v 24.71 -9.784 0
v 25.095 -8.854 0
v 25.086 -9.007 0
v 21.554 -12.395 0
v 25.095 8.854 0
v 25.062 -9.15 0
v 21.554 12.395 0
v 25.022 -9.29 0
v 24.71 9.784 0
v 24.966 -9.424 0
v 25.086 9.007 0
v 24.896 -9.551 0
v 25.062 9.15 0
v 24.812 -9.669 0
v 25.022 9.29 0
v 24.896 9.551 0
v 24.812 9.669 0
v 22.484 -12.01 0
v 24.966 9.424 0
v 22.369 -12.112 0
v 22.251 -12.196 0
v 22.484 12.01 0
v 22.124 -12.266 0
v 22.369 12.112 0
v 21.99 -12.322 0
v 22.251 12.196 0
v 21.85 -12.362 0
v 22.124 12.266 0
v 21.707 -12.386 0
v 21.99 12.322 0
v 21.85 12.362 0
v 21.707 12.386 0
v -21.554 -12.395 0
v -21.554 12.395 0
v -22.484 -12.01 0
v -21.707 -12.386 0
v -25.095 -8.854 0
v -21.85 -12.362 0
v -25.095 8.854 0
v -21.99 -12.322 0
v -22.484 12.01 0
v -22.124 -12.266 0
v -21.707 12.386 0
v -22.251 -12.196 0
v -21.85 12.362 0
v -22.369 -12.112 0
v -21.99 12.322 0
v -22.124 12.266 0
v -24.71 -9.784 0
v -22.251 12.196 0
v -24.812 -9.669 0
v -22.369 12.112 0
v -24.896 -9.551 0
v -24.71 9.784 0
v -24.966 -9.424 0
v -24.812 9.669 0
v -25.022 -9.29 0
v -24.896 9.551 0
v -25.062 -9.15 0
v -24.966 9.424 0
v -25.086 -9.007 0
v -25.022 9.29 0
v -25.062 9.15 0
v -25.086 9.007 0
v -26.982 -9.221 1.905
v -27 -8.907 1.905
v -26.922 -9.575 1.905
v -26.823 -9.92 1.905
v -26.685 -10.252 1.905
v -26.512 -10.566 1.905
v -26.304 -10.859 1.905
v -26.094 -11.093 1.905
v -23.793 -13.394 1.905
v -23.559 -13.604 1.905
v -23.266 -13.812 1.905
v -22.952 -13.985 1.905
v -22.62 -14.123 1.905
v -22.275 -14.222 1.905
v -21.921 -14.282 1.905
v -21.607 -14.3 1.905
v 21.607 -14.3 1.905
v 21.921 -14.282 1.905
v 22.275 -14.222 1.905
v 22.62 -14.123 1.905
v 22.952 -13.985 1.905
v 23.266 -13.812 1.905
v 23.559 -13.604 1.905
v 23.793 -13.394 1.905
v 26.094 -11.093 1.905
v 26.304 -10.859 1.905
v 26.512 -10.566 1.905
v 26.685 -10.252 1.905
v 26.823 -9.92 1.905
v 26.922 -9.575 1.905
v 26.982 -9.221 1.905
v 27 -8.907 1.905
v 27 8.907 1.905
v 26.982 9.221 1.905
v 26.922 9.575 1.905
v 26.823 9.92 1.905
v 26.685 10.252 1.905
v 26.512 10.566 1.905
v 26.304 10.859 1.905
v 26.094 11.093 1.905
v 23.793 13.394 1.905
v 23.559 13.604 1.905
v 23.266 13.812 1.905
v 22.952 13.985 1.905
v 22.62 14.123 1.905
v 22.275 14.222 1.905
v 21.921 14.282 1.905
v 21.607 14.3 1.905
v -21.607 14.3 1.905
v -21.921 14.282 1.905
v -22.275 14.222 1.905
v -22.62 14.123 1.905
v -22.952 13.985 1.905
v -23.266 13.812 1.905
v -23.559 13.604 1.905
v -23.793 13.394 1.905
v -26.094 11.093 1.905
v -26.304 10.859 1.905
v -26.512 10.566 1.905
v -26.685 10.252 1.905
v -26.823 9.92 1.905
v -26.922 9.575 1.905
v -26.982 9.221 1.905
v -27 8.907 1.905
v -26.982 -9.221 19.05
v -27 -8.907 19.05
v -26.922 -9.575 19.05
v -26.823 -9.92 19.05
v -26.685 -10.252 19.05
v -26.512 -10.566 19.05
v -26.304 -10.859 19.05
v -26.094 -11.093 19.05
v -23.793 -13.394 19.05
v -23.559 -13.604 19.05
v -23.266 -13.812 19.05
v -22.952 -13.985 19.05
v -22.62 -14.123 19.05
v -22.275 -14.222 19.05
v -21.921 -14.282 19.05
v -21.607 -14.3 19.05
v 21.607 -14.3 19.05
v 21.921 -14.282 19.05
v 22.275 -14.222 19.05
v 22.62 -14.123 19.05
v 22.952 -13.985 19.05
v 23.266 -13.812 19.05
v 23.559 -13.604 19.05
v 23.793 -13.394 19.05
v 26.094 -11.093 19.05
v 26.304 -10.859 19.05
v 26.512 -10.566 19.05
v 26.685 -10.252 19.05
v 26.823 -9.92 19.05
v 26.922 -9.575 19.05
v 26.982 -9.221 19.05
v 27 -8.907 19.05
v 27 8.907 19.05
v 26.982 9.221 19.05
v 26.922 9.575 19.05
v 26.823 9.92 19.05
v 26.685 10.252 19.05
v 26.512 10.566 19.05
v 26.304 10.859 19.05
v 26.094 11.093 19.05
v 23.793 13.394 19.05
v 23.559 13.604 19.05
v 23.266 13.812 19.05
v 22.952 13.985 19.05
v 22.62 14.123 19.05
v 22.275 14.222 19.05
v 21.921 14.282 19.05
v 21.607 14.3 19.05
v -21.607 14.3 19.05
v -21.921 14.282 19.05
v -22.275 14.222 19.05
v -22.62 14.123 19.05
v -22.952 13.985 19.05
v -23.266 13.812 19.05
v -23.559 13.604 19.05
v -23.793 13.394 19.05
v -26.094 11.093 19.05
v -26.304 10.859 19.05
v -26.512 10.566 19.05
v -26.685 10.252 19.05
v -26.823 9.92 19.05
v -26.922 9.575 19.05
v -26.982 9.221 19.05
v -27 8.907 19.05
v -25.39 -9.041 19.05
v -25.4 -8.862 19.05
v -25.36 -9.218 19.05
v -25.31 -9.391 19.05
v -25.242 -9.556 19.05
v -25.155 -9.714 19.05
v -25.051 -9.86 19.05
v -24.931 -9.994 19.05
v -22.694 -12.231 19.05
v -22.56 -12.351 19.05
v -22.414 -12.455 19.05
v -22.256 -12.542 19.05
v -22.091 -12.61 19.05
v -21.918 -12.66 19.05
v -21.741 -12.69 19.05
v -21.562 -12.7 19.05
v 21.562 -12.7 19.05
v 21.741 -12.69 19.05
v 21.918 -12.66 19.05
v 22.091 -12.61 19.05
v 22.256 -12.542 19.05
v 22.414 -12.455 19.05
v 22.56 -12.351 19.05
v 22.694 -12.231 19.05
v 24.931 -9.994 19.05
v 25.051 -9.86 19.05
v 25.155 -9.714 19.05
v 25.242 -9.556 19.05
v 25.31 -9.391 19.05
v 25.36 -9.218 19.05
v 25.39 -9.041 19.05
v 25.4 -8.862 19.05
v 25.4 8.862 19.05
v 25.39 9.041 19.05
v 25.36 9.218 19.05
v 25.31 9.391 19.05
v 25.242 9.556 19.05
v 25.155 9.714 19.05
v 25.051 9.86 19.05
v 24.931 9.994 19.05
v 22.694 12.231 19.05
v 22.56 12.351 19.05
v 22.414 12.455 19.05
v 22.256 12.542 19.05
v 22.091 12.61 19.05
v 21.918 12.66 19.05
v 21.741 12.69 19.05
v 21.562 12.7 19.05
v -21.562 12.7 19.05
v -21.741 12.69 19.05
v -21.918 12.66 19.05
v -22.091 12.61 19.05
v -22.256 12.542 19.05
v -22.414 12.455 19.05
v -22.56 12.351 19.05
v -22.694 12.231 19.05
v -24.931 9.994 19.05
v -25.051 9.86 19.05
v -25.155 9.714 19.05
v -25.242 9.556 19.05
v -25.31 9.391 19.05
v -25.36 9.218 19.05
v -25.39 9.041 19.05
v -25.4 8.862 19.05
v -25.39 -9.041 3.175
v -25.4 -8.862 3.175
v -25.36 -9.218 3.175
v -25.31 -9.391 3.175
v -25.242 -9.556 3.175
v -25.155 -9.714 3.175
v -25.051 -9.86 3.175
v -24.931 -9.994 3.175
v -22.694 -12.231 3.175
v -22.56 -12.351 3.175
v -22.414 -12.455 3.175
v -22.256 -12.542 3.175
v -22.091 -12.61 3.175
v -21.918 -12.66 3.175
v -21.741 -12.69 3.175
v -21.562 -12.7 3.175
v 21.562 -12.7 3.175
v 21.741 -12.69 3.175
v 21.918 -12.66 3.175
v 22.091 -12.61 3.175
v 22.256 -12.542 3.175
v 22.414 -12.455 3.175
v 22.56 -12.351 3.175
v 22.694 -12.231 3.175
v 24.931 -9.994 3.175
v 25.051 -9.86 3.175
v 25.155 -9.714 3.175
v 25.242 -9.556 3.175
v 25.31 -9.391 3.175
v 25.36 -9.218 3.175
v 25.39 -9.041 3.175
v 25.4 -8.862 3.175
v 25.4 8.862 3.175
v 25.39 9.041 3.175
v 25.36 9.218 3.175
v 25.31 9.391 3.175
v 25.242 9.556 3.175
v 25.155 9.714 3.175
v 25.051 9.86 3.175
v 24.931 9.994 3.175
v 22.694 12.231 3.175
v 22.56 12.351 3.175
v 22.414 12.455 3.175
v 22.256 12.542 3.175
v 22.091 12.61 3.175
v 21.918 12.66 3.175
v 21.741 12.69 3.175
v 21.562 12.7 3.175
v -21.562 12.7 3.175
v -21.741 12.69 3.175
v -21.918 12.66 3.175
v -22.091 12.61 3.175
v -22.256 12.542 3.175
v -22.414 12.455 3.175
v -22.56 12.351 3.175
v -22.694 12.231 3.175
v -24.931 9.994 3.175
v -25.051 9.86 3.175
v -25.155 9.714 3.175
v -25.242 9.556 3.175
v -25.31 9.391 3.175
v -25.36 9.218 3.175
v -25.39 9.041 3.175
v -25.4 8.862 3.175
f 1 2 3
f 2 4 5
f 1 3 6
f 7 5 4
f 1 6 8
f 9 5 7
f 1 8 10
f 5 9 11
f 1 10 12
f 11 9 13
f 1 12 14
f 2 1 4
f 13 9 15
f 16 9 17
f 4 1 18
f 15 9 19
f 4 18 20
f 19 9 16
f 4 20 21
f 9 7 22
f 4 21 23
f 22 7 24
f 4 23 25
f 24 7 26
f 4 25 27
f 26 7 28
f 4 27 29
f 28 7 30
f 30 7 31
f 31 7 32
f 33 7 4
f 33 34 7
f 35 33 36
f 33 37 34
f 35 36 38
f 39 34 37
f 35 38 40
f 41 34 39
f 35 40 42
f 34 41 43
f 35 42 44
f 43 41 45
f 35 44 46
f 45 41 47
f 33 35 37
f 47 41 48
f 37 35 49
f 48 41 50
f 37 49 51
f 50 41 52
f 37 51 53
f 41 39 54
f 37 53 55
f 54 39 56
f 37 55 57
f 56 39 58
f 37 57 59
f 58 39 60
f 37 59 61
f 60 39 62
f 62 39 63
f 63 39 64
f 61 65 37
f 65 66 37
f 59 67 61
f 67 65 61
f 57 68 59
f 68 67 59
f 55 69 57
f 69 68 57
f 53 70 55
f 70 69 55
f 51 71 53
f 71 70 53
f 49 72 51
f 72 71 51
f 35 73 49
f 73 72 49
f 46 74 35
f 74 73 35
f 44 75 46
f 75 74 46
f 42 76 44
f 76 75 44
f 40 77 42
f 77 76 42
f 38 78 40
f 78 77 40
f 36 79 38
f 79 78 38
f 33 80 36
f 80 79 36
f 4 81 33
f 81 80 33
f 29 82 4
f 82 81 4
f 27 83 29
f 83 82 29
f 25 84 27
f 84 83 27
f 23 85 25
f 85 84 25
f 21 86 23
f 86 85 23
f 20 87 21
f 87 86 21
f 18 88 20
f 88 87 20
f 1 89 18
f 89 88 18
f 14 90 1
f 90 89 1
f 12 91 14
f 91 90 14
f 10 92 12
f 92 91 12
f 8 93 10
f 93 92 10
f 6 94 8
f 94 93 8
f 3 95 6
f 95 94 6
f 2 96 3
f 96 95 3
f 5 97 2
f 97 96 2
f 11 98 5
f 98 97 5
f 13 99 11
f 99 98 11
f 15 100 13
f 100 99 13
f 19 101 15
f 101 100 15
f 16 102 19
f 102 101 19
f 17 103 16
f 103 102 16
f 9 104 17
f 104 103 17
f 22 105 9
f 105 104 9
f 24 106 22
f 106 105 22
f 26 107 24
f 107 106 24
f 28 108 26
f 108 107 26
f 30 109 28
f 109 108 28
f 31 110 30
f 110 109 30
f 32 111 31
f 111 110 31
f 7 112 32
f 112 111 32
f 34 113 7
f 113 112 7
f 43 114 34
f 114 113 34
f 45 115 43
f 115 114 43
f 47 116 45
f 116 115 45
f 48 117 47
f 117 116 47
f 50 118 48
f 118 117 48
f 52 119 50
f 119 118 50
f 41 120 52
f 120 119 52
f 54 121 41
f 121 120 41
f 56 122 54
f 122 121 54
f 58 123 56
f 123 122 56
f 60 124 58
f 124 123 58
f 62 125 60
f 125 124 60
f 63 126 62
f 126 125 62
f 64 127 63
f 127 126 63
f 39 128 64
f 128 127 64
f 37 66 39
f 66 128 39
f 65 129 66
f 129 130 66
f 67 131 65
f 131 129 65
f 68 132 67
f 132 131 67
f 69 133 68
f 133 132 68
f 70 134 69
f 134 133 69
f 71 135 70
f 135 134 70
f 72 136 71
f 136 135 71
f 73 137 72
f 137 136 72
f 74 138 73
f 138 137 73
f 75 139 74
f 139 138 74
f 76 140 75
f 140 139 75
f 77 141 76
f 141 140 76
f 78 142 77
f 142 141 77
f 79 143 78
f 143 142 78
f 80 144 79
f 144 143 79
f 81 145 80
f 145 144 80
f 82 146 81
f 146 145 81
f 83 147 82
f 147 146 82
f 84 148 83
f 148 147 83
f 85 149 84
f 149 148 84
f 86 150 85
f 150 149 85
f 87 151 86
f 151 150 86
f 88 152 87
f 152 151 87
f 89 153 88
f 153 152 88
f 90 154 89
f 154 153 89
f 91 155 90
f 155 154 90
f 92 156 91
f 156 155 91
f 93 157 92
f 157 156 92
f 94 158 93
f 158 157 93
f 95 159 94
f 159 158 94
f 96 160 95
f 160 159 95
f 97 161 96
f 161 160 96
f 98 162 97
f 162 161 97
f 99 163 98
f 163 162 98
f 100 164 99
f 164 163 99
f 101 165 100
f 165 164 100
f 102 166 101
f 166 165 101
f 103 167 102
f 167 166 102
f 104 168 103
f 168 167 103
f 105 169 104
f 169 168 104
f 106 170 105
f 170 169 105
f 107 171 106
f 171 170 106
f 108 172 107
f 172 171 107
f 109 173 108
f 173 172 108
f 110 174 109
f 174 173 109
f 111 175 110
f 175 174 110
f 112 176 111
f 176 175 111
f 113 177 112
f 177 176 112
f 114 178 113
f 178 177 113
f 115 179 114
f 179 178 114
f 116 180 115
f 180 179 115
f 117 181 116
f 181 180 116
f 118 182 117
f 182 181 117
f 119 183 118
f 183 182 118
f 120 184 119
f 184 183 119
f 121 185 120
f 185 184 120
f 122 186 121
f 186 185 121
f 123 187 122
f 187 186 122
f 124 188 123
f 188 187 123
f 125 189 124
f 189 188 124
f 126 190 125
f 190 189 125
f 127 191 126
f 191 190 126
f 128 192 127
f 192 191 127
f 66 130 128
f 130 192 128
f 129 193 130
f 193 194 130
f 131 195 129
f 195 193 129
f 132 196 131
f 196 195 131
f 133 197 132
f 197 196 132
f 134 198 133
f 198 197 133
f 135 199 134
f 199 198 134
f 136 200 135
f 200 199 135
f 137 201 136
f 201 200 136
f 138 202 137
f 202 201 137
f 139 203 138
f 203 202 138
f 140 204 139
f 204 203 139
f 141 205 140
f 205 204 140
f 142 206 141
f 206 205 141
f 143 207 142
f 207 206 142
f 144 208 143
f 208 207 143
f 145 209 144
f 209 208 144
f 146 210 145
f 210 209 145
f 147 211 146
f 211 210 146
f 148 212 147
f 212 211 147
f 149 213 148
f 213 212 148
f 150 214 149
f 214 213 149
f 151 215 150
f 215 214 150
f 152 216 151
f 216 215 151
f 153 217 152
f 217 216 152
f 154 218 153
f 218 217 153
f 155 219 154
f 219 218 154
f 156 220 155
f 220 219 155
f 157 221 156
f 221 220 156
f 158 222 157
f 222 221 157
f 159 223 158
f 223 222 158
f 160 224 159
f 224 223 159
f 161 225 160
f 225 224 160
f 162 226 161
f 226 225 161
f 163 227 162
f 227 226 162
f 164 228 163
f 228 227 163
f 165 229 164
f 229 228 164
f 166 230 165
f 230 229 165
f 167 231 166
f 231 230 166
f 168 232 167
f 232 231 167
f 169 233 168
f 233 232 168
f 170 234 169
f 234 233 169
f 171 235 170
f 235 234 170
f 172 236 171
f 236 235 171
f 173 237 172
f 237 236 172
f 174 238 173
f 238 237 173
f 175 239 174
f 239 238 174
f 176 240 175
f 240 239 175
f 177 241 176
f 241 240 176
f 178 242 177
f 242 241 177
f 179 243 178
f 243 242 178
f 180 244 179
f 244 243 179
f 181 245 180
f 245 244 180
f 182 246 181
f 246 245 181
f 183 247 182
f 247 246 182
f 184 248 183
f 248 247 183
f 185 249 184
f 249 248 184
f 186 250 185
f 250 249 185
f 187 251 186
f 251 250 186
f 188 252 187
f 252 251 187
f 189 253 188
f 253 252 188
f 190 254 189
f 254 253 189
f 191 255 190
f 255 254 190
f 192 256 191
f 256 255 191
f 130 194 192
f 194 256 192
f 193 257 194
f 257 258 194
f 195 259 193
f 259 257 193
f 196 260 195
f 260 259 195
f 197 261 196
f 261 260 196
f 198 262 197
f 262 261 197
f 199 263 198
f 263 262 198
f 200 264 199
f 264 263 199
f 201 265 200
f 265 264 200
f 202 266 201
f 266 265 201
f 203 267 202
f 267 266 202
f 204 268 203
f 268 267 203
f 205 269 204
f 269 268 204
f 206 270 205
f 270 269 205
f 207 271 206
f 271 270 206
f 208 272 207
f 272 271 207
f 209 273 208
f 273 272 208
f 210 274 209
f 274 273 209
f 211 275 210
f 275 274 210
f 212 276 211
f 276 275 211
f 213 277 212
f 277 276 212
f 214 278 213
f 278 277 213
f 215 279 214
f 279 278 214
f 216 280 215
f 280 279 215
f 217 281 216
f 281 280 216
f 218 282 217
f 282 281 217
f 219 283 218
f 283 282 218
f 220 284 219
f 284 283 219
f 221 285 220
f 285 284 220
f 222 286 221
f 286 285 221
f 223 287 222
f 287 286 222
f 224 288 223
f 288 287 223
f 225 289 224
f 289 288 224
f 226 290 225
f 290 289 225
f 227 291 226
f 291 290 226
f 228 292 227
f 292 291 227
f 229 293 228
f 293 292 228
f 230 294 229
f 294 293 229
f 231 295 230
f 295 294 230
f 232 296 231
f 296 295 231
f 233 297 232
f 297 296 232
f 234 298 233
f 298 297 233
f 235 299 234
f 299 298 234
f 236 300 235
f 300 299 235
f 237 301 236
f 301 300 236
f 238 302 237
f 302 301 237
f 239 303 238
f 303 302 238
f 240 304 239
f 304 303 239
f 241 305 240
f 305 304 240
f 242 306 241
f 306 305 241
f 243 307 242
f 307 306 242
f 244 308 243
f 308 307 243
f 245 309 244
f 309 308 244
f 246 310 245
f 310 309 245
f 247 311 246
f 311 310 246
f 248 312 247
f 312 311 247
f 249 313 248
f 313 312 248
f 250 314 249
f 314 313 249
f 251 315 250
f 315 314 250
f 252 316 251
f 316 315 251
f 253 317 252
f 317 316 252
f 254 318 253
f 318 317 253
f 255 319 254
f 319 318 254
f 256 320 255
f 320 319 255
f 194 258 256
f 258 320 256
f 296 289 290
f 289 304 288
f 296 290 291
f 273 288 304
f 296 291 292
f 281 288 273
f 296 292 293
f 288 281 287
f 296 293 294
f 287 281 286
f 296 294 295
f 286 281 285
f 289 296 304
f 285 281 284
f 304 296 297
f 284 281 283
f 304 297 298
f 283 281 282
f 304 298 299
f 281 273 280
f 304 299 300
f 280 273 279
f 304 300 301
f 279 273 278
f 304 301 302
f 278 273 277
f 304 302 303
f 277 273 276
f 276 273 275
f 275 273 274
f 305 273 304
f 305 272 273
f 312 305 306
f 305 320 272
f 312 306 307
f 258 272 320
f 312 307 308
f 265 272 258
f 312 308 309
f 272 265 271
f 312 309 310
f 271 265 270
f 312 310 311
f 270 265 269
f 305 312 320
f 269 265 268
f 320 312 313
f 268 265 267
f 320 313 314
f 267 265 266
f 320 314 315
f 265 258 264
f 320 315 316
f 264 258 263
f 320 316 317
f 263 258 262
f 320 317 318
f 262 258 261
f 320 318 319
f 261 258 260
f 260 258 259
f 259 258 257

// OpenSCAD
// file: ../lib/TOGMod1Constructors.scad
// TOGMod1Constructors-v1.11
// 
// Functions to construct objects understood by TOGMod1
// 
// v1.1:
// - Add togmod1_make_rounded_rect
// v1.2:
// - togmod1_make_rounded_rect can make ovals
// v1.3:
// - togmod1_circle_points, to just get the points of a circle
// - if pos parameter to circle function has a third element,
//   returned vertexes will include it as the z component;
// v1.3.1
// - Some assertions
// v1.4:
// - Refactor togmod1_rounded_rect_points and togmod1_circle_points
//   to use togmod1__make_nd_vector_adder for adapting to whatever
//   `pos` parameter is.
// v1.5:
// - togmod_rounded_rect_points will not simplify completely rounded sides
//   (where length of side is exactly twice the rounding radius)
//   unless simplify_rounded_sides=true
//   - This makes it more useful for polyhedron generation,
//     where radius varies, but number of points must remain constant.
// v1.6:
// - togmod1_make_rect makes a simple rectangle
// - togmod1_make_rounded_rect will defer to togmod1_make_rect when r=0
// v1.7:
// - togmod1_make_circle will return empty shape (["union"]) when d=0
// v1.8:
// - Add togmod1_text
// v1.9:
// - togmod1_circle_points uses 3 as minimum circle point count instead of 6
// v1.10:
// - Fix togmod1_linear_extrude_y so that range corresponds to Y start/end and
//   polygon X,Y correspond to X,Z.  Previously it was rotated wrongly,
//   which would have gone unnoticed for symmetrical shapes centered at 0,0.
// v1.11:
// - Remove an 'echo'

use <./TOGArrayLib1.scad>

function togmod1__make_nd_vector_adder(origin=[0,0]) =
	let(origin_is_zero = tal1_reduce(true, origin, function(prev,item) prev && item == 0))
	origin_is_zero ? (function(vec) len(vec) >= len(origin) ? vec : tal1_replace_at(origin, 0, vec)) :
	function(vec) [
		for(i=[0:1:max(len(origin),len(vec))-1]) (len(vec) > i ? vec[i] : 0) + (len(origin) > i ? origin[i] : 0),
	];

assert([1,2,3] == togmod1__make_nd_vector_adder()([1,2,3]));
assert([1,2,3] == togmod1__make_nd_vector_adder([0,0,3])([1,2]));


function togmod1_make_cuboid(size) =
	assert(is_list(size))
	assert(len(size) >= 3)
	assert(is_num(size[0]))
	assert(is_num(size[1]))
	assert(is_num(size[2]))
	["polyhedron-vf", [
		[-size[0]/2, -size[1]/2, -size[2]/2],
		[+size[0]/2, -size[1]/2, -size[2]/2],
		[-size[0]/2, +size[1]/2, -size[2]/2],
		[+size[0]/2, +size[1]/2, -size[2]/2],
		[-size[0]/2, -size[1]/2, +size[2]/2],
		[+size[0]/2, -size[1]/2, +size[2]/2],
		[-size[0]/2, +size[1]/2, +size[2]/2],
		[+size[0]/2, +size[1]/2, +size[2]/2]
	], [
		[0,1,3,2],[0,4,5,1],[4,6,7,5],[3,7,6,2],[1,5,7,3],[6,4,0,2]
	]];

function togmod1_make_polygon(verts) =
	["polygon-vp", verts, [[for( i=[0:1:len(verts)-1] ) i%len(verts)]]];

function togmod1_rounded_rect_points(size, r, pos=[0,0], simplify_rounded_sides=false) =
	assert(is_list(size))
	assert(len(size) >= 2)
	let(radii = is_list(r) ? r : is_num(r) ? [r,r] : assert(false, "rounded_rect r(adius) should be list<num> or num"))
	let(rx = radii[0])
	let(ry = radii[1])
	assert(is_num(rx))
	assert(is_num(ry))
	assert(size[0] >= 2*rx, str("size[0] must be >= 2*r[0]; size[0] = ",size[0],", 2*r[0] = ",2*rx))
	assert(size[1] >= 2*ry, str("size[1] must be >= 2*r[1]; size[1] = ",size[1],", 2*r[1] = ",2*ry))
	let(quarterfn=max($fn/4, 1))
	let(qfnx = simplify_rounded_sides && size[0] == 2*rx ? quarterfn-1 : quarterfn)
	let(qfny = simplify_rounded_sides && size[1] == 2*ry ? quarterfn-1 : quarterfn)
	let(finalizepos = togmod1__make_nd_vector_adder(pos))
[
	for(a=[0 : 1 : qfnx]) let(ang=      a*90/quarterfn) finalizepos([ size[0]/2-rx + rx*cos(ang),  size[1]/2-ry + ry*sin(ang)]),
	for(a=[0 : 1 : qfny]) let(ang= 90 + a*90/quarterfn) finalizepos([-size[0]/2+rx + rx*cos(ang),  size[1]/2-ry + ry*sin(ang)]),
	for(a=[0 : 1 : qfnx]) let(ang=180 + a*90/quarterfn) finalizepos([-size[0]/2+rx + rx*cos(ang), -size[1]/2+ry + ry*sin(ang)]),
	for(a=[0 : 1 : qfny]) let(ang=270 + a*90/quarterfn) finalizepos([ size[0]/2-rx + rx*cos(ang), -size[1]/2+ry + ry*sin(ang)]),
];

function togmod1_make_rect(size) =
	togmod1_make_polygon([
		[-size[0]/2, -size[1]/2],
		[+size[0]/2, -size[1]/2],
		[+size[0]/2, +size[1]/2],
		[-size[0]/2, +size[1]/2],
	]);

function togmod1_make_rounded_rect(size, r) =
	r == 0 ? togmod1_make_rect(size) :
	togmod1_make_polygon(togmod1_rounded_rect_points(size,r,simplify_rounded_sides=true));

/**
 * Returns points for an approximation of a circle where points are at distance r from pos.
 * Can be used to make other regular polygons, but the faces will be less than that
 * distance from pos (do some trig if you want face distance, e.g. for a hex nut).
 */
function togmod1_circle_points(r, pos=[0,0], d=undef) =
	assert( !is_undef(r) || !is_undef(d) )
	assert(!is_undef(pos[0]))
	assert(!is_undef(pos[1]))
	let(finalizepos = togmod1__make_nd_vector_adder(pos))
	let(r_ = !is_undef(r) ? r : d/2)
	let(fn = max($fn, 3))
	[for(i=[0 : 1 : fn-1]) finalizepos([r_*cos(i*360/fn), r_*sin(i*360/fn)])];

function togmod1_make_circle(r, pos=[0,0], d=undef) =
	r == 0 || d == 0 ? ["union"] :
	togmod1_make_polygon(togmod1_circle_points(r=r, pos=pos, d=d));

function togmod1_make_cylinder(d, zrange=[0,1], r=undef, pos=[0,0]) =
	assert( !is_undef(r) || !is_undef(d) )
	let( r_ = !is_undef(r) ? r : d/2 )
	// TODO: Make polyhedron directly
	["linear-extrude-zs", zrange, togmod1_make_circle(r=r_, pos=pos)];

function togmod1__is_range1d(range) = is_list(range) && len(range) == 2 && is_num(range[0]) && is_num(range[1]);

function togmod1_linear_extrude_z(range, shape) =
	assert(togmod1__is_range1d(range))
	["linear-extrude-zs", range, shape];
function togmod1_linear_extrude_x(range, shape) =
	assert(togmod1__is_range1d(range))
	["rotate", [90, 0, 90], togmod1_linear_extrude_z(range, shape)];
function togmod1_linear_extrude_y(range, shape) =
	assert(togmod1__is_range1d(range))
	["rotate", [90, 0,  0], togmod1_linear_extrude_z([-range[1], -range[0]], shape)];

function togmod1_text(text, size, font, halign, valign, spacing, direction, language, script) =
	["text-tsfhvsdls", text, size, font, halign, valign, spacing, direction, language, script];
// file: ../lib/TOGArrayLib1.scad
// TOGArrayLib1.5
// 
// Functions for working with arrays.
// 
// v1.1:
// - tal1_reduce assert(is_list(items)) to prevent infinite recursion
//   when given undefined or other non-list values
// v1.1.1:
// - Fix tal1_uniq_remap_v2 to return "list-remap-result" as the
//   first element of the returned list
// v1.2:
// - Add tal1_replace_at function
// v1.3:
// - tal1_is_vec_of, tal1_is_vec_of_num
// v1.4:
// - tal1_assert_for_each, for when you want to assert something
//   about each of a list of items and get nice failure messages
// v1.5:
// - Add tal1_duplicate_reversed function, which may be
//   handy when generating symmetrical polygons and stuff.

/**
 * Make a list with the contents of list `a`,
 * but starting at offset `off`, replaced by the contents of list `b`.
 * len(result) = max(len(a), off+len(b))
 */
function tal1_replace_at(a, off, b, default_value=undef, default_value_function=undef) =
	assert(is_list(a))
	assert(is_list(b))
	let( _dvf = !is_undef(default_value_function) ? default_value_function : function(i) default_value )
[
	for( i=[0:1:min(off,len(a))-1] ) a[i],
	for( i=[len(a):1:off-1] ) _dvf(i),
	for( i=[off:1:off+len(b)-1] ) b[i-off],
	for( i=[off+len(b):1:len(a)-1] ) a[i],
];

// Simplest case
assert([] == tal1_replace_at([], 0, []));
// Second simplest cases
assert(["foo"] == tal1_replace_at(["foo"], 0, []));
assert(["foo"] == tal1_replace_at([], 0, ["foo"]));
// Replace one item
assert(["foo","quux","baz"] == tal1_replace_at(["foo","bar","baz"], 1, ["quux"]));
// Replace and extend
assert(["foo","quux","tuna","tina"] == tal1_replace_at(["foo","bar","baz"], 1, ["quux", "tuna", "tina"]));
// Add beyond end of `a`
assert(["foo","zzz","quux"] == tal1_replace_at(["foo"], 2, ["quux"], default_value="zzz"));
// Adding 'nothing' should still fill to that point with defaults
assert(["foo","zzz","zzz"] == tal1_replace_at(["foo"], 3, [], default_value="zzz"));


function tal1_reduce(start, items, func, offset=0) =
	assert(is_list(items))
	len(items) == offset ? start :
	tal1_reduce(func(start, items[offset]), items, func, offset+1);

function tal1_consecutive_duplicate_count(items) = tal1_reduce(
	[0, undef],
	items,
	function(z,item) [z[0] + (item == z[1] ? 1 : 0), item]
)[0];

assert(0 == tal1_consecutive_duplicate_count([]));
assert(0 == tal1_consecutive_duplicate_count([50]));
assert(1 == tal1_consecutive_duplicate_count([50,50]));
assert(0 == tal1_consecutive_duplicate_count([50,51,52,53]));
assert(1 == tal1_consecutive_duplicate_count([50,51,52,52]));
assert(3 == tal1_consecutive_duplicate_count([50,50,50,50]));

// Set test_size to arbirarily large values
// to ensure that OpenSCAD can handle heavy recursion
let(test_size=1000) assert(test_size/2 == tal1_consecutive_duplicate_count([for(i=[0:1:test_size-1]) floor(i/2)]));



function tal1_uniq_(items, off0, off1) =
	let(chunklen = off1-off0)
	chunklen == 0 ? [] :
	chunklen == 1 ? [items[off0]] :
	let(half=floor(chunklen/2))
	let(left  = tal1_uniq_(items, off0     , off0+half))
	let(right = tal1_uniq_(items, off0+half, off1     ))
	assert(len(left) > 0)
	assert(len(right) > 0)
	left[len(left)-1] == right[0] ? [each left, for(i=[1:1:len(right)-1]) right[i]] :
	[each left, each right];

/** Given a list of items, returns a new list with identical consecutive items merged */
function tal1_uniq(items) = tal1_uniq_(items, 0, len(items));

assert([] == tal1_uniq([]));
assert([123] == tal1_uniq([123]));
assert([55,0,1,2,3] == tal1_uniq([55,0,1,2,3]));
assert([55,0,1,2] == tal1_uniq([55,0,1,1,2]));
assert([55,0,1] == tal1_uniq([55,55,0,0,0,0,0,0,1,1,1,1]));
assert([55,0] == tal1_uniq([55,0,0,0,0,0,0,0]));



/**
 * Returns [new items, old index -> new index mapping].
 * No-op version.
 */
function tal1_uniq_remap_v1(items) =
	["list-remap-result", items, [for (vi=[0:1:len(items)-1]) vi]];

// [a, a, b, b, c, c]
//
// [a,    ...], []  -> [a],[0]
// [a, a, ...], [0] -> [a],[0,0]

assert([1,2,3] == [1,2,3]);

/**
 * Recursive version that will combine adjacent identical vertexes,
 * but will use the original items.
 */
function tal1_uniq_remap_v2(items, map=[]) =
	let(index = len(map))
	len(items) == index ? ["list-remap-result", items, map] :
	index == 0 ? tal1_uniq_remap_v2(items, [0]) :
	items[index] == items[map[index-1]] ? tal1_uniq_remap_v2(items, [for(vi=map) vi, map[index-1]]) :
	tal1_uniq_remap_v2(items, [for(vi=map) vi, index]);

assert(tal1_uniq_remap_v2([1,1,2,2,3,4]) == ["list-remap-result", [1,1,2,2,3,4], [0,0,2,2,4,5]]);


/**
 * Returns true if `vec` is a list of at least min_len items
 * and component_check(each item, even those beyond min_len) is true.
 */
function tal1_is_vec_of(vec, min_len=0, component_check=function(x) true) =
	assert(is_num(min_len) && min_len >= 0)
	assert(is_function(component_check))
	is_list(vec) && len(vec) >= min_len &&
	tal1_reduce(true, vec, function(prev,item) prev && component_check(item));

function tal1_is_vec_of_num(vec, min_len=0) = tal1_is_vec_of(vec, min_len, function(i) is_num(i));

assert( true == tal1_is_vec_of_num([1,2,3]));
assert( true == tal1_is_vec_of_num([]));
assert( true == tal1_is_vec_of_num([1,2,3], 3));
assert(false == tal1_is_vec_of_num([1,2], 3));
assert(false == tal1_is_vec_of_num([1,2,"spoon"], 3));
// Requirements are ambiguous when
// first min_len items are numbers, but there are non-numeric items afterwards,
// so let's error on the side of saying 'no, it's not a list of numbers';
// i.e. the item check and the min_len are independent.
assert(false == tal1_is_vec_of_num([1,2,3,"artichoke"], 3));


/**
 * Asserts that item_checker(each item in list, index of item)[0] is true.
 * Second element of item_checker return value is assertion message.
 * Returns the original list, in case that's useful to you.
 */
function tal1_assert_for_each(list, item_checker) =
	let( _ignored = [ for(i=[0:1:len(list)-1])
		let(q=item_checker(list[i],i))
		let(passed=is_bool(q) ? q : is_list(q) ? q[0] : assert(false, str(
			"tal1_assert_for_each: item_checker should return Bool|[Bool,String], but returned ",
			q, " for item at index ", i)))
		let(message=is_list(q) ? q[1] : undef)
		assert(passed, message)
		q
	])
	list;

// Callback can return a boolean...
assert([1,2,3] == tal1_assert_for_each([1,2,3], function(v,i) is_num(v)));
// ...or a [boolean, string]
assert([1,2,3] == tal1_assert_for_each([1,2,3], function(v,i) [is_num(v), "element be a num"]));

// [a, b, c] -> [a, b, c, rxf(c), rxf(b), rxf(a)]
function tal1_duplicate_reversed(list, rxf=function(item) item) =
	[
		each list,
		for( i=[len(list)-1 : -1 : 0] ) rxf(list[i]),
	];
// file: ../lib/TOGVecLib0.scad
// Note: TOGMod1Constructors's togmod1__make_nd_vector_adder is used for similar purpose.

function togvec0_extend(vec, length, filler=0) = [
	for( i=[0 : 1 : length-1] ) len(vec) <= i ? filler : vec[i]
];

function togvec0_add_vec(a, b) =
	let( newlen = max(len(a), len(b)) )
	togvec0_extend(a, newlen) + togvec0_extend(b, newlen);

function togvec0_offset_points(points, offset, numtovec=function(n) [0,0,n] ) =
	let( offset_vec =
		is_list(offset) ? offset :
		is_num(offset) ? numtovec(offset) :
		assert(false, str("togvec0_offset_points: `offset` must be a List<Number> or Number; got: ", offset)) )
	[for(p=points) togvec0_add_vec(p, offset_vec)];
// file: ../lib/TOGComplexLib1.scad
function tcplx1_multiply(a, b) =
	[a[0]*b[0] - a[1]*b[1], a[0]*b[1] + a[1]*b[0]];
function tcplx1_divide(a, b) =
	let(bot = (b[0]*b[0] + b[1]*b[1]))
	[
		(a[0]*b[0] + a[1]*b[1])/bot,
		(a[1]*b[0] - a[0]*b[1])/bot
	];

assert([-11,23] == tcplx1_multiply([3,2], [1,7]));

assert([-1,3] == tcplx1_multiply([3,1], [0,1]));
assert([-1,3] == tcplx1_multiply([0,1], [3,1]));

echo(tcplx1_divide([-1,3], [3,1]));
assert([0,1] == tcplx1_divide([-1,3], [3,1]));

function tcplx1_normalize(vec) =
	let(veclen = sqrt(vec[0]*vec[0]+vec[1]*vec[1]))
	[vec[0] / veclen, vec[1] / veclen];

function tcplx1_relative_turnvec_vv(v0, v1) =
	tcplx1_divide(tcplx1_normalize(v1), tcplx1_normalize(v0));

function tcplx1_relative_turnvec_abc(p0, p1, p2) = tcplx1_relative_turnvec_vv(p1-p0, p2-p1);

// A 90-degree turn
assert([0,1] == tcplx1_relative_turnvec_abc([0,0], [1,0], [1,1]));
assert([0,1] == tcplx1_relative_turnvec_abc([0,0], [0,1], [-1,1]));

// A 45-degree turn
assert(tcplx1_normalize([1,1]) == tcplx1_relative_turnvec_abc([0,0], [1,0], [ 2,1]));
assert(tcplx1_normalize([1,1]) == tcplx1_relative_turnvec_abc([0,0], [0,1], [-1,2]));


function tcplx1_relative_angle_abc(p0, p1, p2) =
	let(turnvec = tcplx1_relative_turnvec_abc(p0, p1, p2))
	atan2(turnvec[1], turnvec[0]);

assert(-135 == tcplx1_relative_angle_abc([0,0], [1,0], [0,-1]));
assert( -90 == tcplx1_relative_angle_abc([0,0], [1,0], [1,-1]));
assert(   0 == tcplx1_relative_angle_abc([0,0], [1,0], [2, 0]));
assert(  90 == tcplx1_relative_angle_abc([0,0], [1,0], [1, 1]));
assert( 135 == tcplx1_relative_angle_abc([0,0], [1,0], [0, 1]));

assert(  90 == tcplx1_relative_angle_abc([1,1], [3,3], [1, 5]));
// file: ../lib/SimpleCap0.scad
// SimpleCap0.4
// 
// Library for making very simple caps for things
// whose outline can be described by a rath.
// 
// Versions:
// v0.2:
// - Bevel the bottom somewhat
// v0.3:
// - Allow bevel_size to be overridden.
//   Useful in cases where the default makes an invalid shape.
// v0.4
// - Support floor_thickness=0 meaning 'hollow tube'

use <../lib/TOGPath1.scad>
use <../lib/TOGPolyhedronLib1.scad>
use <../lib/TOGVecLib0.scad>

function simplecap0_decode_rath(shape) =
	assert(is_list(shape) && len(shape) >= 1, str("Shape must be a list of length at least 1, got: ", shape))
	shape[0] == "togpath1-rath" ? shape :
	shape[0] == "circle-d" ? togpath1_make_circle_rath(r=shape[1]/2) :
	shape[0] == "circle-r" ? togpath1_make_circle_rath(r=shape[1]) :
	shape[0] == "oval-wh" ? let(size=shape[1]) togpath1_make_rectangle_rath([size[0],size[1]], [["round", min(size[0],size[1])/2]]) :
	assert(false, str("Unrecognized shape description: ", shape));

function simplecap0_make_cap(inner_shape, total_height=19.05, floor_thickness=3.175, wall_thickness=1.6, bevel_size=undef) =
	let( rath = simplecap0_decode_rath(inner_shape) )
	let( eff_bevel_size = !is_undef(bevel_size) ? bevel_size :
		// Could be clever here based on wall_thickness and the rath.
		// For now, default to effectively floor_thicknesS*0.6, since that matches existing behavior.
		max(0.1, floor_thickness*0.6)
	)
	let( t0 = 0, t1 = wall_thickness )
	let( y0 = 0, yt = total_height, yf = floor_thickness )
	let( bb = eff_bevel_size )
	let( closed = yf > 0 )
	tphl1_make_polyhedron_from_layer_function([
		[y0   , t1-bb],
		[y0+abs(bb), t1   ],
		[yt   , t1   ],
		[yt   , t0   ],
		[yf   , t0   ],
		if( !closed ) [yf, t1-bb],
	], function(zo) let(z = zo[0], wall_offset=zo[1])
	   togpath1_rath_to_polypoints(togpath1_offset_rath(rath, wall_offset)),
		layer_points_transform = "key0-to-z",
		cap_top    = closed,
		cap_bottom = closed
	);
// file: ../lib/TOGMod1.scad
// TOGMod1.9
// OpenSCAD library for representing shapes
// 
// See also: Functional OpenSCAD (https://github.com/thehans/FunctionalOpenSCAD)
// 
// v1.8:
// - Add `text-tsfhvsdls`
// v1.9
// - Add `offset-ds` (offset with _d_elta a _s_hape)

module togmod1_domodule(mod) {
	assert(is_list(mod));
	assert(len(mod) > 0);
	if( mod[0] == "polygon-vp" ) {
		// ["polygon-vp", vertexes, paths]
		polygon(points=mod[1], paths=mod[2]);
	} else if( mod[0] == "polyhedron-vf" ) {
		polyhedron(mod[1], faces=mod[2]);
	} else if( mod[0] == "scale" ) {
		assert(len(mod) == 3);
		scale(mod[1]) togmod1_domodule(mod[2]);
	} else if( mod[0] == "translate" ) {
		assert(len(mod) == 3);
		assert(is_list(mod[1]));
		for(c=mod[1]) assert(is_num(c), "translate component should be numeric");
		translate(mod[1]) togmod1_domodule(mod[2]);
	} else if( mod[0] == "rotate" ) {
		assert(len(mod) == 3);
		rotate(mod[1]) togmod1_domodule(mod[2]);
	} else if( mod[0] == "intersection" ) {
		intersection_for( i=[1:1:len(mod)-1] ) togmod1_domodule(mod[i]);
	} else if( mod[0] == "difference" ) {
		difference() {
			togmod1_domodule(mod[1]);
			for( i=[2:1:len(mod)-1] ) togmod1_domodule(mod[i]);
		}
	} else if( mod[0] == "union" ) {
		for( i=[1:1:len(mod)-1] ) togmod1_domodule(mod[i]);
	} else if( mod[0] == "hull" ) {
		hull() for( i=[1:1:len(mod)-1] ) togmod1_domodule(mod[i]);
	} else if( mod[0] == "offset-rs" ) {
		assert(len(mod) == 3);
		assert(is_num(mod[1]));
		assert(is_list(mod[2]));
		offset(mod[1]) togmod1_domodule(mod[2]);
	} else if( mod[0] == "linear-extrude-zs" ) {
		// ["linear-extrude-zs", [z0,z1], 2d_shape] // centered
		// ["linear-extrude-zs", height, 2d_shape]
		let( zrange = is_list(mod[1]) ? mod[1] : [-mod[1]/2, mod[1]/2] ) {
			translate([0,0,zrange[0]]) linear_extrude(zrange[1]-zrange[0]) togmod1_domodule(mod[2]);
		}
	} else if( mod[0] == "render" ) {
		render() togmod1_domodule(mod[1]);
	} else if( mod[0] == "minkowski" ) {
		minkowski() {
			togmod1_domodule(mod[1]);
			togmod1_domodule(mod[2]);
		}
	} else if( mod[0] == "x-debug" ) {
		# togmod1_domodule(mod[1]);
	} else if( mod[0] == "x-color" ) {
		color(mod[1]) togmod1_domodule(mod[2]);
	} else if( mod[0] == "text-tsfhvsdls" ) {
		text(text=mod[1], size=mod[2], font=mod[3], halign=mod[4], valign=mod[5], spacing=mod[6], direction=mod[7], language=mod[7], script=mod[8]);
	} else if( mod[0] == "offset-ds" ) {
		assert(is_num(mod[1]));
		assert(is_list(mod[2]));
		offset(delta=mod[1]) togmod1_domodule(mod[2]);
	} else {
		assert(false, str("Unrecognized shape: ", mod[0]));
	}
}
// main file
// TOGridPileOverCap0.1
// 
// A cap that just fits over the block.
// Will collide with neighboring blocks' caps.
// Intended to be printed in PETG and for non-tesselating uses.

size_atoms = [4, 2];
$fn = 64;

use <../lib/TOGPath1.scad>
use <../lib/TOGMod1.scad>
use <../lib/SimpleCap0.scad>

function mkcaprath(size, offset) = togpath1_make_rectangle_rath(size, corner_ops=[["bevel", 3.175], ["round", 1.6], ["offset", offset]]);

cap =
let( size = size_atoms * 12.7 )
let( inner_rath = mkcaprath(size, 0) )
simplecap0_make_cap(inner_rath);

togmod1_domodule(cap);
